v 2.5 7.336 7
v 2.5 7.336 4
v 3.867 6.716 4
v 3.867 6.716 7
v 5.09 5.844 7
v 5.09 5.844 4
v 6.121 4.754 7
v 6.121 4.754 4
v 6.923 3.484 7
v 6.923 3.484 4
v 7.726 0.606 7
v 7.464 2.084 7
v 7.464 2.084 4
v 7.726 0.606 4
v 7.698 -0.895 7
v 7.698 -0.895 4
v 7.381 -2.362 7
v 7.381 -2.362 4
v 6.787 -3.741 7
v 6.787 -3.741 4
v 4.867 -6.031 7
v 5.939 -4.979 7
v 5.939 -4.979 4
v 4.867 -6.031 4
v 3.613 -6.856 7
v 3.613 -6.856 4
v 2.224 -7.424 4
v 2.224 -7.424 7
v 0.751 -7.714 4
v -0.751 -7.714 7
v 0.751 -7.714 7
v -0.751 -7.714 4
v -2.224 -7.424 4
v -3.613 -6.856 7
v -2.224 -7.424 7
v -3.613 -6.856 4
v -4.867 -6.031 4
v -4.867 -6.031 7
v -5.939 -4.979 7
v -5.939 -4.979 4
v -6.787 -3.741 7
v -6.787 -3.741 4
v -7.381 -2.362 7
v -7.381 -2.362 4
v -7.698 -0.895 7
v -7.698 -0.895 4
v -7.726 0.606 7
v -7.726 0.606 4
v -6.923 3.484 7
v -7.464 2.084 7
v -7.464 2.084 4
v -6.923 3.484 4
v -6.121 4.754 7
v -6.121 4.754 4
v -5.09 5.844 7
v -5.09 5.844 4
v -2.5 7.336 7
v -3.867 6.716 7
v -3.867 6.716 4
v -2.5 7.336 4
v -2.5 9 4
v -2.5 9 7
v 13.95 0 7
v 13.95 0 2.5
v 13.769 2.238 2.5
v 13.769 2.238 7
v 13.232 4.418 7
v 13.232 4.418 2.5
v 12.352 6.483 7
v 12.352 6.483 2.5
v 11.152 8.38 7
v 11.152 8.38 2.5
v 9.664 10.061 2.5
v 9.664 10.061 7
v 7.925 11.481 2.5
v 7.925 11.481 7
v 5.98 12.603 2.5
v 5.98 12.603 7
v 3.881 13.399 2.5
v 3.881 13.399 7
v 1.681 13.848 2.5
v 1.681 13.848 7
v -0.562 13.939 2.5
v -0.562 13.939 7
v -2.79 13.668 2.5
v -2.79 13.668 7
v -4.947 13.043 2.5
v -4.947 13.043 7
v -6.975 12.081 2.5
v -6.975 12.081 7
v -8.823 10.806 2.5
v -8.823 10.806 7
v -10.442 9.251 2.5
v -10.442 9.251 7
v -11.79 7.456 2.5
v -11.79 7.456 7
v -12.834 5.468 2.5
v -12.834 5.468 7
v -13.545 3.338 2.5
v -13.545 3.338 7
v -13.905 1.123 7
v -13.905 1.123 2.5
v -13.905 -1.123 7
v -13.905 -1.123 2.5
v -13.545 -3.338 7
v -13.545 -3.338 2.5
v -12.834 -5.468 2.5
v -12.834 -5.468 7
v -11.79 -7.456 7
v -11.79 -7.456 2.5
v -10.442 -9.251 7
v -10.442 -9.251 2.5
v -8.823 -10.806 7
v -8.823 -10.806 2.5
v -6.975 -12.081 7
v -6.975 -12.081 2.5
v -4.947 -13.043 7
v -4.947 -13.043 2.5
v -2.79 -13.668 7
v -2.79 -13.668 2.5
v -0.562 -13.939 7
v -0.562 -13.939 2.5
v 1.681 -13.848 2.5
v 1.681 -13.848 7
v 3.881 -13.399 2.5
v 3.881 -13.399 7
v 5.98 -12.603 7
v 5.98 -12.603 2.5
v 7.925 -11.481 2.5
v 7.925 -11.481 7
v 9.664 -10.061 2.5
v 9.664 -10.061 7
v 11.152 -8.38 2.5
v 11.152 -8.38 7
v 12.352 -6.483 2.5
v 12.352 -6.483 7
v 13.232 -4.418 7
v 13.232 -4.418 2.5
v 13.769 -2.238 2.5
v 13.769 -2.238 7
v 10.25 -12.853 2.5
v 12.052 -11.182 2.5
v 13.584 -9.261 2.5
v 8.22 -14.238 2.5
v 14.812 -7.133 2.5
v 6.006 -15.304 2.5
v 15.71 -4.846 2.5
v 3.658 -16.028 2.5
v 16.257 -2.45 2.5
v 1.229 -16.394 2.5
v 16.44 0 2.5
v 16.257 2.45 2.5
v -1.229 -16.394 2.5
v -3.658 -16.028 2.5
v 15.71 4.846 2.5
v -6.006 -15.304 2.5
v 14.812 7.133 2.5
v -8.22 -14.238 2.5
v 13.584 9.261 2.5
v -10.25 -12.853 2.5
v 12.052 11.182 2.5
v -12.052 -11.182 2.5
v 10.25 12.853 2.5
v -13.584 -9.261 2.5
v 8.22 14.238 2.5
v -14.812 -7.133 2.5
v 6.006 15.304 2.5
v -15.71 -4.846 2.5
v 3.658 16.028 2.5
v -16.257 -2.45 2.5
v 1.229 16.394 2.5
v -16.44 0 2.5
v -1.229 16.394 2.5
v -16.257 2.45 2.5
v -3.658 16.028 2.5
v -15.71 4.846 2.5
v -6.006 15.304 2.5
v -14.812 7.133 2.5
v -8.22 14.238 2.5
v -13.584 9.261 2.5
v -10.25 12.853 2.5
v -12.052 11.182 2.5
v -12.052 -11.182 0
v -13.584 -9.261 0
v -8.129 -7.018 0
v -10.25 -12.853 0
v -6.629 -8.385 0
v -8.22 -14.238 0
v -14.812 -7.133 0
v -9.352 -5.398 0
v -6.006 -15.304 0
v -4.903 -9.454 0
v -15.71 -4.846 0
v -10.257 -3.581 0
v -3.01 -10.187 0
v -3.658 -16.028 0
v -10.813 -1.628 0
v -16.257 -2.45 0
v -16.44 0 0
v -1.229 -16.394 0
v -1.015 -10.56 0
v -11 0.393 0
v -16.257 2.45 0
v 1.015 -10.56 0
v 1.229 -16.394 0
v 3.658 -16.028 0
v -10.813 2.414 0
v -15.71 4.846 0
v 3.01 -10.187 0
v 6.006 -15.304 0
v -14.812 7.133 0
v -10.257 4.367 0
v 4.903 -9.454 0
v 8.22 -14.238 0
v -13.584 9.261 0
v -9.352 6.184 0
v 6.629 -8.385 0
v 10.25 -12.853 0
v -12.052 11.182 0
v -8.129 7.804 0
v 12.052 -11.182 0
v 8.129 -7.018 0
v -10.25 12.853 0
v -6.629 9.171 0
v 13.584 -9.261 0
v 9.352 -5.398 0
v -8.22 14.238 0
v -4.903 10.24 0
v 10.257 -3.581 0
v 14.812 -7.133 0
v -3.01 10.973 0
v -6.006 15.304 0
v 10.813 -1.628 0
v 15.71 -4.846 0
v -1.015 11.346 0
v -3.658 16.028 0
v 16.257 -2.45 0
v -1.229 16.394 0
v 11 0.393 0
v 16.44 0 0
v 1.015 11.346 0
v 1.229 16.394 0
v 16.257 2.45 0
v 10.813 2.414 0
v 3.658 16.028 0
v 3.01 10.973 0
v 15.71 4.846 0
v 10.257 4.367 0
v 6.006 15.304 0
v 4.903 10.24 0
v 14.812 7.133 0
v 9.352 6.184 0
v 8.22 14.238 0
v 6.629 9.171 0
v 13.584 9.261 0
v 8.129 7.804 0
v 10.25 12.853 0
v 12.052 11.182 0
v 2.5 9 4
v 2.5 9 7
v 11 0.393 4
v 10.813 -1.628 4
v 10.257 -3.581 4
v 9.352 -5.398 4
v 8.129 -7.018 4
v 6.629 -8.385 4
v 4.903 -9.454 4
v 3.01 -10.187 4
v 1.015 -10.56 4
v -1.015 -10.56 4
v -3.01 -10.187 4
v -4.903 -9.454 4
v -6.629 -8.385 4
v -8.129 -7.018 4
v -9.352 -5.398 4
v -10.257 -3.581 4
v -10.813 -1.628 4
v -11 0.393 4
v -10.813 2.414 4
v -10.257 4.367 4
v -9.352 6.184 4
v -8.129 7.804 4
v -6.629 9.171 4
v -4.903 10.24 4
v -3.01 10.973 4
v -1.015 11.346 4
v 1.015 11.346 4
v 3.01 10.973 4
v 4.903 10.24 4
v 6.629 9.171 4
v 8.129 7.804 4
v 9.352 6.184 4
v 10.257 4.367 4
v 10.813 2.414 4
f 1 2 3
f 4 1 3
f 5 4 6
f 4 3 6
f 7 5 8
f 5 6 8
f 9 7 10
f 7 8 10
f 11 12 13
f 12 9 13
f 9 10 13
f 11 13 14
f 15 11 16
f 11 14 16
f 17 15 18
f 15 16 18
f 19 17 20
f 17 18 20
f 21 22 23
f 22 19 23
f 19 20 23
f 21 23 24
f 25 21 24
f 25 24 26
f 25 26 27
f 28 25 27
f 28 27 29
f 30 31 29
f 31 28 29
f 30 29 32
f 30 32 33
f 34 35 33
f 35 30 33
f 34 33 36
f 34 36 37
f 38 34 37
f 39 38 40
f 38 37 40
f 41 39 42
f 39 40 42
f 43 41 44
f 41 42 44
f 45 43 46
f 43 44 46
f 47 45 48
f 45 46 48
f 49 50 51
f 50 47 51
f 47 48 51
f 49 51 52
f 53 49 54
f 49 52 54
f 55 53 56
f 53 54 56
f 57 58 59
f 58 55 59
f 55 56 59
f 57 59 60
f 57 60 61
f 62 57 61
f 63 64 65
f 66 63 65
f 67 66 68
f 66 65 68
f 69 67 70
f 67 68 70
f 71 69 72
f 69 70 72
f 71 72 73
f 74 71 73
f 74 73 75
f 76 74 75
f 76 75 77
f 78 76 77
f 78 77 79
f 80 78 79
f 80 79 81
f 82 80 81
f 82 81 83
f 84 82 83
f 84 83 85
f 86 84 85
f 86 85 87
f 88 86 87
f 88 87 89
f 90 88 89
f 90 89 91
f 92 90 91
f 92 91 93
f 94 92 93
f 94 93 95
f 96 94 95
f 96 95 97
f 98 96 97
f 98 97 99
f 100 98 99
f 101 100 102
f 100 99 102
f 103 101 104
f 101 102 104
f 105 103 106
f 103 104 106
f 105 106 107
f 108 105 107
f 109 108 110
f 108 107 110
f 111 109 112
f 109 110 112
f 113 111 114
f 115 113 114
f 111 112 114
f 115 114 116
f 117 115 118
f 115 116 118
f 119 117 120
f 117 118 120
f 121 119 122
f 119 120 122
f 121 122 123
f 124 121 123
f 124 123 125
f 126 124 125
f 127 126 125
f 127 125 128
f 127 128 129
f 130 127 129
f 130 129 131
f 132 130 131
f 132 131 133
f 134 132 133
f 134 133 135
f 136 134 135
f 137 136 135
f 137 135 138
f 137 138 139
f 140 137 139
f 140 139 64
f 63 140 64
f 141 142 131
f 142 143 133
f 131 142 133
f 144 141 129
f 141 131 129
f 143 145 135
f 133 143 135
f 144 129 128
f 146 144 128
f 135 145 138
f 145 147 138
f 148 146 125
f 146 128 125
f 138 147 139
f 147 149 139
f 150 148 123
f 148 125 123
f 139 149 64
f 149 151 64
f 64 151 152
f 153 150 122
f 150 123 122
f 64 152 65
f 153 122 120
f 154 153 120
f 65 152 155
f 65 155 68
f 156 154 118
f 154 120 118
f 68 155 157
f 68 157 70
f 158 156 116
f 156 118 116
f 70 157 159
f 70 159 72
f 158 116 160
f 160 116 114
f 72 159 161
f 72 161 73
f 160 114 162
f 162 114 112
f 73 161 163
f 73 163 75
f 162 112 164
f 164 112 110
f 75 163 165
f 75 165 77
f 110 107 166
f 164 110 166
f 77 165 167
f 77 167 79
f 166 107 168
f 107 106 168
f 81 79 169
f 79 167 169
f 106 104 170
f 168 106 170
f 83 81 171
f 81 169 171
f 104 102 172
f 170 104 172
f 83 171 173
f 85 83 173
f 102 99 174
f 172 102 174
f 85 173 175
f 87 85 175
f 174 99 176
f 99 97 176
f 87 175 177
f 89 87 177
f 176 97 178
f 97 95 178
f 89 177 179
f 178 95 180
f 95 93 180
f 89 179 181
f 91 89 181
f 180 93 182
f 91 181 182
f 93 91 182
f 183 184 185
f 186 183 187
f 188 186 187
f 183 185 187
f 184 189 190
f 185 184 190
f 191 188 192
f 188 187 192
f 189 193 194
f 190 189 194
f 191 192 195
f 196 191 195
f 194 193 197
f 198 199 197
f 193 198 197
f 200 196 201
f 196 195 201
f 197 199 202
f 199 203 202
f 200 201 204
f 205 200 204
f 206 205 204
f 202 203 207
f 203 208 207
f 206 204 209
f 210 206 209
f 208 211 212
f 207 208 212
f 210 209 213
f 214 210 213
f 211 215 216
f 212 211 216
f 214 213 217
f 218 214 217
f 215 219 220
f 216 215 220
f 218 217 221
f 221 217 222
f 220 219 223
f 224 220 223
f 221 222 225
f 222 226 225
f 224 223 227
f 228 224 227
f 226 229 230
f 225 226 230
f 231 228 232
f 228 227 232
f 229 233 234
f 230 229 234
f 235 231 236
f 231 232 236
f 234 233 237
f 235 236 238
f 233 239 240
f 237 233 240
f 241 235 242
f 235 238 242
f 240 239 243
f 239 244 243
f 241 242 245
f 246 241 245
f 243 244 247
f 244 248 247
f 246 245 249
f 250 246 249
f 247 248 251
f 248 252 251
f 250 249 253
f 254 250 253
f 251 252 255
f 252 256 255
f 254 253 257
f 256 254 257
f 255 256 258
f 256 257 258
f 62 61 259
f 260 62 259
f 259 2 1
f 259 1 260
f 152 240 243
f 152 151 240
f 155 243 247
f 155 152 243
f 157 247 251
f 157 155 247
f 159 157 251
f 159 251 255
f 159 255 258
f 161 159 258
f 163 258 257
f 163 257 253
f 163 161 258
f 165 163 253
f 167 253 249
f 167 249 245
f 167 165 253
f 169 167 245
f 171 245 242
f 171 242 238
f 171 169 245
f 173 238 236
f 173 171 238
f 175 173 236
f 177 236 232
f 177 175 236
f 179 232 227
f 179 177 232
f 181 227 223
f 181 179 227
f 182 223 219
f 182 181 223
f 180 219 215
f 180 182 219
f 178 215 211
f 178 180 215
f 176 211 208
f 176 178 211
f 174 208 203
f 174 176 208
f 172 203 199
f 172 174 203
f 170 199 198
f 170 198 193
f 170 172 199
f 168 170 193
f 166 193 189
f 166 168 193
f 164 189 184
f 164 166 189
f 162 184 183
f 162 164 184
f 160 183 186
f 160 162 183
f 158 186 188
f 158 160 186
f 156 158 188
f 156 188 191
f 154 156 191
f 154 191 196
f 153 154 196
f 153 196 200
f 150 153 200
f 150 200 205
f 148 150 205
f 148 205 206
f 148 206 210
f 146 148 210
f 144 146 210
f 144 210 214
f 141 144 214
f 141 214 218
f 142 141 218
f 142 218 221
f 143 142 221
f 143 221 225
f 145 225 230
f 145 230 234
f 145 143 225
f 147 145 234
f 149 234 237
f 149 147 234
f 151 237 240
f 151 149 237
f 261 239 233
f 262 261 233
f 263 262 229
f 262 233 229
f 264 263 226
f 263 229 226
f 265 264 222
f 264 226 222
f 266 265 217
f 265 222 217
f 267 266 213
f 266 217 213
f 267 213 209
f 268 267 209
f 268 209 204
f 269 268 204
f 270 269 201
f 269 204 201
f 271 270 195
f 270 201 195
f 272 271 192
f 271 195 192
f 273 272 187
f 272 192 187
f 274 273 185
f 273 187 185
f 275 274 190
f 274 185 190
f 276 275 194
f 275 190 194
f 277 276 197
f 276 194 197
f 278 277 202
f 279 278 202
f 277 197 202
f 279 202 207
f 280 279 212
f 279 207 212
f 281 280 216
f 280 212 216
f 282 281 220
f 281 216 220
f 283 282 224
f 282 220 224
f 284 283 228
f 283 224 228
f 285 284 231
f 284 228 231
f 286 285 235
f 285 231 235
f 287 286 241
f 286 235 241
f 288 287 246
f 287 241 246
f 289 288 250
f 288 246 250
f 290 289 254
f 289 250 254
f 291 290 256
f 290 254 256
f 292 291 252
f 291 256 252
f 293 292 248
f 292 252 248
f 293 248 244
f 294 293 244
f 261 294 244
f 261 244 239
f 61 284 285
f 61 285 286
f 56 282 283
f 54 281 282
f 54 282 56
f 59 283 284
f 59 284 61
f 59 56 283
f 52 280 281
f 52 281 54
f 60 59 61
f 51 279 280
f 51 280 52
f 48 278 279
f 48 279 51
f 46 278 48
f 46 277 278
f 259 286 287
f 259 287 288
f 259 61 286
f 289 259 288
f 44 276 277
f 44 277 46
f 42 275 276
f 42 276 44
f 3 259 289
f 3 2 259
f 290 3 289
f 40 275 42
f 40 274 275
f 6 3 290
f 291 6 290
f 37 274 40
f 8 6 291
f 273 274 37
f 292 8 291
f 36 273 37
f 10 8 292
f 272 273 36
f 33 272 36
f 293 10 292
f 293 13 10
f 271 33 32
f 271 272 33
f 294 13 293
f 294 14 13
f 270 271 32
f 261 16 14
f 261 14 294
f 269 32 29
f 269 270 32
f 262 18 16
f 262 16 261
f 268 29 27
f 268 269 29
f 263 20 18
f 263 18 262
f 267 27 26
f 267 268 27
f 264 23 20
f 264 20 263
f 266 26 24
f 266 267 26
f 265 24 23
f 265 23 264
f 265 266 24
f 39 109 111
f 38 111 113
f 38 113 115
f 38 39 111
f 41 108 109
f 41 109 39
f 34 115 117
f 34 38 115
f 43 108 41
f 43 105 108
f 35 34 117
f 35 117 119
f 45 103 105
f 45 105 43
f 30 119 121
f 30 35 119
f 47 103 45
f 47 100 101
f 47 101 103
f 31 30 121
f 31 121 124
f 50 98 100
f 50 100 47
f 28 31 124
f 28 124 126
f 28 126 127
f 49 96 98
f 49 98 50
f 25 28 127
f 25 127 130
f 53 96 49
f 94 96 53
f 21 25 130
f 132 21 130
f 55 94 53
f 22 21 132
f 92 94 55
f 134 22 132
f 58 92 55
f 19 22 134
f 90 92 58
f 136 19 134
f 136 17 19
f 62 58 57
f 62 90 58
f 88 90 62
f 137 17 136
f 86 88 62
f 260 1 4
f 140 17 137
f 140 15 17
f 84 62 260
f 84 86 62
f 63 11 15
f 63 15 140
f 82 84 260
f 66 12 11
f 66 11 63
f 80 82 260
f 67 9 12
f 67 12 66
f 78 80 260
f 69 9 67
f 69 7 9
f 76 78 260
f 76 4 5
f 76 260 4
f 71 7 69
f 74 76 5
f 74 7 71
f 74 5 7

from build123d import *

# Parameters (mm, degrees)
F0_R     = 13.95
F1_DEPTH = 7
F2_R     = 11
F3_DEPTH = 4
F4_R     = 7.75
F5_DEPTH = 25
F6_W     = 2.5
F6_H     = 2.5
F8_W     = 5
F8_H     = 9
F9_DEPTH = 25


with BuildPart() as f1:
    # F0 (on Top) → F1 (new body)
    with BuildSketch(Plane.XY):
        Circle(F0_R)
    extrude(amount=F1_DEPTH)

    # F2 (on face) → F3 (cut)
    with BuildSketch(Plane(origin=(0, 0, 0), x_dir=(1, 0, 0), z_dir=(0, 0, -1))):
        with Locations((0, -0.393073)):
            Circle(F2_R)
    extrude(amount=-F3_DEPTH, mode=Mode.SUBTRACT)

    # F4 (on face) → F5 (cut)
    with BuildSketch(Plane(origin=(0, 0, 4), x_dir=(1, 0, 0), z_dir=(0, 0, -1))):
        Circle(F4_R)
    extrude(amount=-F5_DEPTH, mode=Mode.SUBTRACT)

    # F6 (on Front) → F7 (revolve)
    with BuildSketch(Plane.XZ):
        with Locations((15.190209, 1.25)):
            Rectangle(F6_W, F6_H)
    revolve(axis=Axis((0, 0, 5.198275), (0, 0, 1)))

    # F8 (on Top) → F9 (cut)
    with BuildSketch(Plane.XY):
        with Locations((0, 4.5)):
            Rectangle(F8_W, F8_H)
    extrude(amount=F9_DEPTH, mode=Mode.SUBTRACT)


solid = f1.part
